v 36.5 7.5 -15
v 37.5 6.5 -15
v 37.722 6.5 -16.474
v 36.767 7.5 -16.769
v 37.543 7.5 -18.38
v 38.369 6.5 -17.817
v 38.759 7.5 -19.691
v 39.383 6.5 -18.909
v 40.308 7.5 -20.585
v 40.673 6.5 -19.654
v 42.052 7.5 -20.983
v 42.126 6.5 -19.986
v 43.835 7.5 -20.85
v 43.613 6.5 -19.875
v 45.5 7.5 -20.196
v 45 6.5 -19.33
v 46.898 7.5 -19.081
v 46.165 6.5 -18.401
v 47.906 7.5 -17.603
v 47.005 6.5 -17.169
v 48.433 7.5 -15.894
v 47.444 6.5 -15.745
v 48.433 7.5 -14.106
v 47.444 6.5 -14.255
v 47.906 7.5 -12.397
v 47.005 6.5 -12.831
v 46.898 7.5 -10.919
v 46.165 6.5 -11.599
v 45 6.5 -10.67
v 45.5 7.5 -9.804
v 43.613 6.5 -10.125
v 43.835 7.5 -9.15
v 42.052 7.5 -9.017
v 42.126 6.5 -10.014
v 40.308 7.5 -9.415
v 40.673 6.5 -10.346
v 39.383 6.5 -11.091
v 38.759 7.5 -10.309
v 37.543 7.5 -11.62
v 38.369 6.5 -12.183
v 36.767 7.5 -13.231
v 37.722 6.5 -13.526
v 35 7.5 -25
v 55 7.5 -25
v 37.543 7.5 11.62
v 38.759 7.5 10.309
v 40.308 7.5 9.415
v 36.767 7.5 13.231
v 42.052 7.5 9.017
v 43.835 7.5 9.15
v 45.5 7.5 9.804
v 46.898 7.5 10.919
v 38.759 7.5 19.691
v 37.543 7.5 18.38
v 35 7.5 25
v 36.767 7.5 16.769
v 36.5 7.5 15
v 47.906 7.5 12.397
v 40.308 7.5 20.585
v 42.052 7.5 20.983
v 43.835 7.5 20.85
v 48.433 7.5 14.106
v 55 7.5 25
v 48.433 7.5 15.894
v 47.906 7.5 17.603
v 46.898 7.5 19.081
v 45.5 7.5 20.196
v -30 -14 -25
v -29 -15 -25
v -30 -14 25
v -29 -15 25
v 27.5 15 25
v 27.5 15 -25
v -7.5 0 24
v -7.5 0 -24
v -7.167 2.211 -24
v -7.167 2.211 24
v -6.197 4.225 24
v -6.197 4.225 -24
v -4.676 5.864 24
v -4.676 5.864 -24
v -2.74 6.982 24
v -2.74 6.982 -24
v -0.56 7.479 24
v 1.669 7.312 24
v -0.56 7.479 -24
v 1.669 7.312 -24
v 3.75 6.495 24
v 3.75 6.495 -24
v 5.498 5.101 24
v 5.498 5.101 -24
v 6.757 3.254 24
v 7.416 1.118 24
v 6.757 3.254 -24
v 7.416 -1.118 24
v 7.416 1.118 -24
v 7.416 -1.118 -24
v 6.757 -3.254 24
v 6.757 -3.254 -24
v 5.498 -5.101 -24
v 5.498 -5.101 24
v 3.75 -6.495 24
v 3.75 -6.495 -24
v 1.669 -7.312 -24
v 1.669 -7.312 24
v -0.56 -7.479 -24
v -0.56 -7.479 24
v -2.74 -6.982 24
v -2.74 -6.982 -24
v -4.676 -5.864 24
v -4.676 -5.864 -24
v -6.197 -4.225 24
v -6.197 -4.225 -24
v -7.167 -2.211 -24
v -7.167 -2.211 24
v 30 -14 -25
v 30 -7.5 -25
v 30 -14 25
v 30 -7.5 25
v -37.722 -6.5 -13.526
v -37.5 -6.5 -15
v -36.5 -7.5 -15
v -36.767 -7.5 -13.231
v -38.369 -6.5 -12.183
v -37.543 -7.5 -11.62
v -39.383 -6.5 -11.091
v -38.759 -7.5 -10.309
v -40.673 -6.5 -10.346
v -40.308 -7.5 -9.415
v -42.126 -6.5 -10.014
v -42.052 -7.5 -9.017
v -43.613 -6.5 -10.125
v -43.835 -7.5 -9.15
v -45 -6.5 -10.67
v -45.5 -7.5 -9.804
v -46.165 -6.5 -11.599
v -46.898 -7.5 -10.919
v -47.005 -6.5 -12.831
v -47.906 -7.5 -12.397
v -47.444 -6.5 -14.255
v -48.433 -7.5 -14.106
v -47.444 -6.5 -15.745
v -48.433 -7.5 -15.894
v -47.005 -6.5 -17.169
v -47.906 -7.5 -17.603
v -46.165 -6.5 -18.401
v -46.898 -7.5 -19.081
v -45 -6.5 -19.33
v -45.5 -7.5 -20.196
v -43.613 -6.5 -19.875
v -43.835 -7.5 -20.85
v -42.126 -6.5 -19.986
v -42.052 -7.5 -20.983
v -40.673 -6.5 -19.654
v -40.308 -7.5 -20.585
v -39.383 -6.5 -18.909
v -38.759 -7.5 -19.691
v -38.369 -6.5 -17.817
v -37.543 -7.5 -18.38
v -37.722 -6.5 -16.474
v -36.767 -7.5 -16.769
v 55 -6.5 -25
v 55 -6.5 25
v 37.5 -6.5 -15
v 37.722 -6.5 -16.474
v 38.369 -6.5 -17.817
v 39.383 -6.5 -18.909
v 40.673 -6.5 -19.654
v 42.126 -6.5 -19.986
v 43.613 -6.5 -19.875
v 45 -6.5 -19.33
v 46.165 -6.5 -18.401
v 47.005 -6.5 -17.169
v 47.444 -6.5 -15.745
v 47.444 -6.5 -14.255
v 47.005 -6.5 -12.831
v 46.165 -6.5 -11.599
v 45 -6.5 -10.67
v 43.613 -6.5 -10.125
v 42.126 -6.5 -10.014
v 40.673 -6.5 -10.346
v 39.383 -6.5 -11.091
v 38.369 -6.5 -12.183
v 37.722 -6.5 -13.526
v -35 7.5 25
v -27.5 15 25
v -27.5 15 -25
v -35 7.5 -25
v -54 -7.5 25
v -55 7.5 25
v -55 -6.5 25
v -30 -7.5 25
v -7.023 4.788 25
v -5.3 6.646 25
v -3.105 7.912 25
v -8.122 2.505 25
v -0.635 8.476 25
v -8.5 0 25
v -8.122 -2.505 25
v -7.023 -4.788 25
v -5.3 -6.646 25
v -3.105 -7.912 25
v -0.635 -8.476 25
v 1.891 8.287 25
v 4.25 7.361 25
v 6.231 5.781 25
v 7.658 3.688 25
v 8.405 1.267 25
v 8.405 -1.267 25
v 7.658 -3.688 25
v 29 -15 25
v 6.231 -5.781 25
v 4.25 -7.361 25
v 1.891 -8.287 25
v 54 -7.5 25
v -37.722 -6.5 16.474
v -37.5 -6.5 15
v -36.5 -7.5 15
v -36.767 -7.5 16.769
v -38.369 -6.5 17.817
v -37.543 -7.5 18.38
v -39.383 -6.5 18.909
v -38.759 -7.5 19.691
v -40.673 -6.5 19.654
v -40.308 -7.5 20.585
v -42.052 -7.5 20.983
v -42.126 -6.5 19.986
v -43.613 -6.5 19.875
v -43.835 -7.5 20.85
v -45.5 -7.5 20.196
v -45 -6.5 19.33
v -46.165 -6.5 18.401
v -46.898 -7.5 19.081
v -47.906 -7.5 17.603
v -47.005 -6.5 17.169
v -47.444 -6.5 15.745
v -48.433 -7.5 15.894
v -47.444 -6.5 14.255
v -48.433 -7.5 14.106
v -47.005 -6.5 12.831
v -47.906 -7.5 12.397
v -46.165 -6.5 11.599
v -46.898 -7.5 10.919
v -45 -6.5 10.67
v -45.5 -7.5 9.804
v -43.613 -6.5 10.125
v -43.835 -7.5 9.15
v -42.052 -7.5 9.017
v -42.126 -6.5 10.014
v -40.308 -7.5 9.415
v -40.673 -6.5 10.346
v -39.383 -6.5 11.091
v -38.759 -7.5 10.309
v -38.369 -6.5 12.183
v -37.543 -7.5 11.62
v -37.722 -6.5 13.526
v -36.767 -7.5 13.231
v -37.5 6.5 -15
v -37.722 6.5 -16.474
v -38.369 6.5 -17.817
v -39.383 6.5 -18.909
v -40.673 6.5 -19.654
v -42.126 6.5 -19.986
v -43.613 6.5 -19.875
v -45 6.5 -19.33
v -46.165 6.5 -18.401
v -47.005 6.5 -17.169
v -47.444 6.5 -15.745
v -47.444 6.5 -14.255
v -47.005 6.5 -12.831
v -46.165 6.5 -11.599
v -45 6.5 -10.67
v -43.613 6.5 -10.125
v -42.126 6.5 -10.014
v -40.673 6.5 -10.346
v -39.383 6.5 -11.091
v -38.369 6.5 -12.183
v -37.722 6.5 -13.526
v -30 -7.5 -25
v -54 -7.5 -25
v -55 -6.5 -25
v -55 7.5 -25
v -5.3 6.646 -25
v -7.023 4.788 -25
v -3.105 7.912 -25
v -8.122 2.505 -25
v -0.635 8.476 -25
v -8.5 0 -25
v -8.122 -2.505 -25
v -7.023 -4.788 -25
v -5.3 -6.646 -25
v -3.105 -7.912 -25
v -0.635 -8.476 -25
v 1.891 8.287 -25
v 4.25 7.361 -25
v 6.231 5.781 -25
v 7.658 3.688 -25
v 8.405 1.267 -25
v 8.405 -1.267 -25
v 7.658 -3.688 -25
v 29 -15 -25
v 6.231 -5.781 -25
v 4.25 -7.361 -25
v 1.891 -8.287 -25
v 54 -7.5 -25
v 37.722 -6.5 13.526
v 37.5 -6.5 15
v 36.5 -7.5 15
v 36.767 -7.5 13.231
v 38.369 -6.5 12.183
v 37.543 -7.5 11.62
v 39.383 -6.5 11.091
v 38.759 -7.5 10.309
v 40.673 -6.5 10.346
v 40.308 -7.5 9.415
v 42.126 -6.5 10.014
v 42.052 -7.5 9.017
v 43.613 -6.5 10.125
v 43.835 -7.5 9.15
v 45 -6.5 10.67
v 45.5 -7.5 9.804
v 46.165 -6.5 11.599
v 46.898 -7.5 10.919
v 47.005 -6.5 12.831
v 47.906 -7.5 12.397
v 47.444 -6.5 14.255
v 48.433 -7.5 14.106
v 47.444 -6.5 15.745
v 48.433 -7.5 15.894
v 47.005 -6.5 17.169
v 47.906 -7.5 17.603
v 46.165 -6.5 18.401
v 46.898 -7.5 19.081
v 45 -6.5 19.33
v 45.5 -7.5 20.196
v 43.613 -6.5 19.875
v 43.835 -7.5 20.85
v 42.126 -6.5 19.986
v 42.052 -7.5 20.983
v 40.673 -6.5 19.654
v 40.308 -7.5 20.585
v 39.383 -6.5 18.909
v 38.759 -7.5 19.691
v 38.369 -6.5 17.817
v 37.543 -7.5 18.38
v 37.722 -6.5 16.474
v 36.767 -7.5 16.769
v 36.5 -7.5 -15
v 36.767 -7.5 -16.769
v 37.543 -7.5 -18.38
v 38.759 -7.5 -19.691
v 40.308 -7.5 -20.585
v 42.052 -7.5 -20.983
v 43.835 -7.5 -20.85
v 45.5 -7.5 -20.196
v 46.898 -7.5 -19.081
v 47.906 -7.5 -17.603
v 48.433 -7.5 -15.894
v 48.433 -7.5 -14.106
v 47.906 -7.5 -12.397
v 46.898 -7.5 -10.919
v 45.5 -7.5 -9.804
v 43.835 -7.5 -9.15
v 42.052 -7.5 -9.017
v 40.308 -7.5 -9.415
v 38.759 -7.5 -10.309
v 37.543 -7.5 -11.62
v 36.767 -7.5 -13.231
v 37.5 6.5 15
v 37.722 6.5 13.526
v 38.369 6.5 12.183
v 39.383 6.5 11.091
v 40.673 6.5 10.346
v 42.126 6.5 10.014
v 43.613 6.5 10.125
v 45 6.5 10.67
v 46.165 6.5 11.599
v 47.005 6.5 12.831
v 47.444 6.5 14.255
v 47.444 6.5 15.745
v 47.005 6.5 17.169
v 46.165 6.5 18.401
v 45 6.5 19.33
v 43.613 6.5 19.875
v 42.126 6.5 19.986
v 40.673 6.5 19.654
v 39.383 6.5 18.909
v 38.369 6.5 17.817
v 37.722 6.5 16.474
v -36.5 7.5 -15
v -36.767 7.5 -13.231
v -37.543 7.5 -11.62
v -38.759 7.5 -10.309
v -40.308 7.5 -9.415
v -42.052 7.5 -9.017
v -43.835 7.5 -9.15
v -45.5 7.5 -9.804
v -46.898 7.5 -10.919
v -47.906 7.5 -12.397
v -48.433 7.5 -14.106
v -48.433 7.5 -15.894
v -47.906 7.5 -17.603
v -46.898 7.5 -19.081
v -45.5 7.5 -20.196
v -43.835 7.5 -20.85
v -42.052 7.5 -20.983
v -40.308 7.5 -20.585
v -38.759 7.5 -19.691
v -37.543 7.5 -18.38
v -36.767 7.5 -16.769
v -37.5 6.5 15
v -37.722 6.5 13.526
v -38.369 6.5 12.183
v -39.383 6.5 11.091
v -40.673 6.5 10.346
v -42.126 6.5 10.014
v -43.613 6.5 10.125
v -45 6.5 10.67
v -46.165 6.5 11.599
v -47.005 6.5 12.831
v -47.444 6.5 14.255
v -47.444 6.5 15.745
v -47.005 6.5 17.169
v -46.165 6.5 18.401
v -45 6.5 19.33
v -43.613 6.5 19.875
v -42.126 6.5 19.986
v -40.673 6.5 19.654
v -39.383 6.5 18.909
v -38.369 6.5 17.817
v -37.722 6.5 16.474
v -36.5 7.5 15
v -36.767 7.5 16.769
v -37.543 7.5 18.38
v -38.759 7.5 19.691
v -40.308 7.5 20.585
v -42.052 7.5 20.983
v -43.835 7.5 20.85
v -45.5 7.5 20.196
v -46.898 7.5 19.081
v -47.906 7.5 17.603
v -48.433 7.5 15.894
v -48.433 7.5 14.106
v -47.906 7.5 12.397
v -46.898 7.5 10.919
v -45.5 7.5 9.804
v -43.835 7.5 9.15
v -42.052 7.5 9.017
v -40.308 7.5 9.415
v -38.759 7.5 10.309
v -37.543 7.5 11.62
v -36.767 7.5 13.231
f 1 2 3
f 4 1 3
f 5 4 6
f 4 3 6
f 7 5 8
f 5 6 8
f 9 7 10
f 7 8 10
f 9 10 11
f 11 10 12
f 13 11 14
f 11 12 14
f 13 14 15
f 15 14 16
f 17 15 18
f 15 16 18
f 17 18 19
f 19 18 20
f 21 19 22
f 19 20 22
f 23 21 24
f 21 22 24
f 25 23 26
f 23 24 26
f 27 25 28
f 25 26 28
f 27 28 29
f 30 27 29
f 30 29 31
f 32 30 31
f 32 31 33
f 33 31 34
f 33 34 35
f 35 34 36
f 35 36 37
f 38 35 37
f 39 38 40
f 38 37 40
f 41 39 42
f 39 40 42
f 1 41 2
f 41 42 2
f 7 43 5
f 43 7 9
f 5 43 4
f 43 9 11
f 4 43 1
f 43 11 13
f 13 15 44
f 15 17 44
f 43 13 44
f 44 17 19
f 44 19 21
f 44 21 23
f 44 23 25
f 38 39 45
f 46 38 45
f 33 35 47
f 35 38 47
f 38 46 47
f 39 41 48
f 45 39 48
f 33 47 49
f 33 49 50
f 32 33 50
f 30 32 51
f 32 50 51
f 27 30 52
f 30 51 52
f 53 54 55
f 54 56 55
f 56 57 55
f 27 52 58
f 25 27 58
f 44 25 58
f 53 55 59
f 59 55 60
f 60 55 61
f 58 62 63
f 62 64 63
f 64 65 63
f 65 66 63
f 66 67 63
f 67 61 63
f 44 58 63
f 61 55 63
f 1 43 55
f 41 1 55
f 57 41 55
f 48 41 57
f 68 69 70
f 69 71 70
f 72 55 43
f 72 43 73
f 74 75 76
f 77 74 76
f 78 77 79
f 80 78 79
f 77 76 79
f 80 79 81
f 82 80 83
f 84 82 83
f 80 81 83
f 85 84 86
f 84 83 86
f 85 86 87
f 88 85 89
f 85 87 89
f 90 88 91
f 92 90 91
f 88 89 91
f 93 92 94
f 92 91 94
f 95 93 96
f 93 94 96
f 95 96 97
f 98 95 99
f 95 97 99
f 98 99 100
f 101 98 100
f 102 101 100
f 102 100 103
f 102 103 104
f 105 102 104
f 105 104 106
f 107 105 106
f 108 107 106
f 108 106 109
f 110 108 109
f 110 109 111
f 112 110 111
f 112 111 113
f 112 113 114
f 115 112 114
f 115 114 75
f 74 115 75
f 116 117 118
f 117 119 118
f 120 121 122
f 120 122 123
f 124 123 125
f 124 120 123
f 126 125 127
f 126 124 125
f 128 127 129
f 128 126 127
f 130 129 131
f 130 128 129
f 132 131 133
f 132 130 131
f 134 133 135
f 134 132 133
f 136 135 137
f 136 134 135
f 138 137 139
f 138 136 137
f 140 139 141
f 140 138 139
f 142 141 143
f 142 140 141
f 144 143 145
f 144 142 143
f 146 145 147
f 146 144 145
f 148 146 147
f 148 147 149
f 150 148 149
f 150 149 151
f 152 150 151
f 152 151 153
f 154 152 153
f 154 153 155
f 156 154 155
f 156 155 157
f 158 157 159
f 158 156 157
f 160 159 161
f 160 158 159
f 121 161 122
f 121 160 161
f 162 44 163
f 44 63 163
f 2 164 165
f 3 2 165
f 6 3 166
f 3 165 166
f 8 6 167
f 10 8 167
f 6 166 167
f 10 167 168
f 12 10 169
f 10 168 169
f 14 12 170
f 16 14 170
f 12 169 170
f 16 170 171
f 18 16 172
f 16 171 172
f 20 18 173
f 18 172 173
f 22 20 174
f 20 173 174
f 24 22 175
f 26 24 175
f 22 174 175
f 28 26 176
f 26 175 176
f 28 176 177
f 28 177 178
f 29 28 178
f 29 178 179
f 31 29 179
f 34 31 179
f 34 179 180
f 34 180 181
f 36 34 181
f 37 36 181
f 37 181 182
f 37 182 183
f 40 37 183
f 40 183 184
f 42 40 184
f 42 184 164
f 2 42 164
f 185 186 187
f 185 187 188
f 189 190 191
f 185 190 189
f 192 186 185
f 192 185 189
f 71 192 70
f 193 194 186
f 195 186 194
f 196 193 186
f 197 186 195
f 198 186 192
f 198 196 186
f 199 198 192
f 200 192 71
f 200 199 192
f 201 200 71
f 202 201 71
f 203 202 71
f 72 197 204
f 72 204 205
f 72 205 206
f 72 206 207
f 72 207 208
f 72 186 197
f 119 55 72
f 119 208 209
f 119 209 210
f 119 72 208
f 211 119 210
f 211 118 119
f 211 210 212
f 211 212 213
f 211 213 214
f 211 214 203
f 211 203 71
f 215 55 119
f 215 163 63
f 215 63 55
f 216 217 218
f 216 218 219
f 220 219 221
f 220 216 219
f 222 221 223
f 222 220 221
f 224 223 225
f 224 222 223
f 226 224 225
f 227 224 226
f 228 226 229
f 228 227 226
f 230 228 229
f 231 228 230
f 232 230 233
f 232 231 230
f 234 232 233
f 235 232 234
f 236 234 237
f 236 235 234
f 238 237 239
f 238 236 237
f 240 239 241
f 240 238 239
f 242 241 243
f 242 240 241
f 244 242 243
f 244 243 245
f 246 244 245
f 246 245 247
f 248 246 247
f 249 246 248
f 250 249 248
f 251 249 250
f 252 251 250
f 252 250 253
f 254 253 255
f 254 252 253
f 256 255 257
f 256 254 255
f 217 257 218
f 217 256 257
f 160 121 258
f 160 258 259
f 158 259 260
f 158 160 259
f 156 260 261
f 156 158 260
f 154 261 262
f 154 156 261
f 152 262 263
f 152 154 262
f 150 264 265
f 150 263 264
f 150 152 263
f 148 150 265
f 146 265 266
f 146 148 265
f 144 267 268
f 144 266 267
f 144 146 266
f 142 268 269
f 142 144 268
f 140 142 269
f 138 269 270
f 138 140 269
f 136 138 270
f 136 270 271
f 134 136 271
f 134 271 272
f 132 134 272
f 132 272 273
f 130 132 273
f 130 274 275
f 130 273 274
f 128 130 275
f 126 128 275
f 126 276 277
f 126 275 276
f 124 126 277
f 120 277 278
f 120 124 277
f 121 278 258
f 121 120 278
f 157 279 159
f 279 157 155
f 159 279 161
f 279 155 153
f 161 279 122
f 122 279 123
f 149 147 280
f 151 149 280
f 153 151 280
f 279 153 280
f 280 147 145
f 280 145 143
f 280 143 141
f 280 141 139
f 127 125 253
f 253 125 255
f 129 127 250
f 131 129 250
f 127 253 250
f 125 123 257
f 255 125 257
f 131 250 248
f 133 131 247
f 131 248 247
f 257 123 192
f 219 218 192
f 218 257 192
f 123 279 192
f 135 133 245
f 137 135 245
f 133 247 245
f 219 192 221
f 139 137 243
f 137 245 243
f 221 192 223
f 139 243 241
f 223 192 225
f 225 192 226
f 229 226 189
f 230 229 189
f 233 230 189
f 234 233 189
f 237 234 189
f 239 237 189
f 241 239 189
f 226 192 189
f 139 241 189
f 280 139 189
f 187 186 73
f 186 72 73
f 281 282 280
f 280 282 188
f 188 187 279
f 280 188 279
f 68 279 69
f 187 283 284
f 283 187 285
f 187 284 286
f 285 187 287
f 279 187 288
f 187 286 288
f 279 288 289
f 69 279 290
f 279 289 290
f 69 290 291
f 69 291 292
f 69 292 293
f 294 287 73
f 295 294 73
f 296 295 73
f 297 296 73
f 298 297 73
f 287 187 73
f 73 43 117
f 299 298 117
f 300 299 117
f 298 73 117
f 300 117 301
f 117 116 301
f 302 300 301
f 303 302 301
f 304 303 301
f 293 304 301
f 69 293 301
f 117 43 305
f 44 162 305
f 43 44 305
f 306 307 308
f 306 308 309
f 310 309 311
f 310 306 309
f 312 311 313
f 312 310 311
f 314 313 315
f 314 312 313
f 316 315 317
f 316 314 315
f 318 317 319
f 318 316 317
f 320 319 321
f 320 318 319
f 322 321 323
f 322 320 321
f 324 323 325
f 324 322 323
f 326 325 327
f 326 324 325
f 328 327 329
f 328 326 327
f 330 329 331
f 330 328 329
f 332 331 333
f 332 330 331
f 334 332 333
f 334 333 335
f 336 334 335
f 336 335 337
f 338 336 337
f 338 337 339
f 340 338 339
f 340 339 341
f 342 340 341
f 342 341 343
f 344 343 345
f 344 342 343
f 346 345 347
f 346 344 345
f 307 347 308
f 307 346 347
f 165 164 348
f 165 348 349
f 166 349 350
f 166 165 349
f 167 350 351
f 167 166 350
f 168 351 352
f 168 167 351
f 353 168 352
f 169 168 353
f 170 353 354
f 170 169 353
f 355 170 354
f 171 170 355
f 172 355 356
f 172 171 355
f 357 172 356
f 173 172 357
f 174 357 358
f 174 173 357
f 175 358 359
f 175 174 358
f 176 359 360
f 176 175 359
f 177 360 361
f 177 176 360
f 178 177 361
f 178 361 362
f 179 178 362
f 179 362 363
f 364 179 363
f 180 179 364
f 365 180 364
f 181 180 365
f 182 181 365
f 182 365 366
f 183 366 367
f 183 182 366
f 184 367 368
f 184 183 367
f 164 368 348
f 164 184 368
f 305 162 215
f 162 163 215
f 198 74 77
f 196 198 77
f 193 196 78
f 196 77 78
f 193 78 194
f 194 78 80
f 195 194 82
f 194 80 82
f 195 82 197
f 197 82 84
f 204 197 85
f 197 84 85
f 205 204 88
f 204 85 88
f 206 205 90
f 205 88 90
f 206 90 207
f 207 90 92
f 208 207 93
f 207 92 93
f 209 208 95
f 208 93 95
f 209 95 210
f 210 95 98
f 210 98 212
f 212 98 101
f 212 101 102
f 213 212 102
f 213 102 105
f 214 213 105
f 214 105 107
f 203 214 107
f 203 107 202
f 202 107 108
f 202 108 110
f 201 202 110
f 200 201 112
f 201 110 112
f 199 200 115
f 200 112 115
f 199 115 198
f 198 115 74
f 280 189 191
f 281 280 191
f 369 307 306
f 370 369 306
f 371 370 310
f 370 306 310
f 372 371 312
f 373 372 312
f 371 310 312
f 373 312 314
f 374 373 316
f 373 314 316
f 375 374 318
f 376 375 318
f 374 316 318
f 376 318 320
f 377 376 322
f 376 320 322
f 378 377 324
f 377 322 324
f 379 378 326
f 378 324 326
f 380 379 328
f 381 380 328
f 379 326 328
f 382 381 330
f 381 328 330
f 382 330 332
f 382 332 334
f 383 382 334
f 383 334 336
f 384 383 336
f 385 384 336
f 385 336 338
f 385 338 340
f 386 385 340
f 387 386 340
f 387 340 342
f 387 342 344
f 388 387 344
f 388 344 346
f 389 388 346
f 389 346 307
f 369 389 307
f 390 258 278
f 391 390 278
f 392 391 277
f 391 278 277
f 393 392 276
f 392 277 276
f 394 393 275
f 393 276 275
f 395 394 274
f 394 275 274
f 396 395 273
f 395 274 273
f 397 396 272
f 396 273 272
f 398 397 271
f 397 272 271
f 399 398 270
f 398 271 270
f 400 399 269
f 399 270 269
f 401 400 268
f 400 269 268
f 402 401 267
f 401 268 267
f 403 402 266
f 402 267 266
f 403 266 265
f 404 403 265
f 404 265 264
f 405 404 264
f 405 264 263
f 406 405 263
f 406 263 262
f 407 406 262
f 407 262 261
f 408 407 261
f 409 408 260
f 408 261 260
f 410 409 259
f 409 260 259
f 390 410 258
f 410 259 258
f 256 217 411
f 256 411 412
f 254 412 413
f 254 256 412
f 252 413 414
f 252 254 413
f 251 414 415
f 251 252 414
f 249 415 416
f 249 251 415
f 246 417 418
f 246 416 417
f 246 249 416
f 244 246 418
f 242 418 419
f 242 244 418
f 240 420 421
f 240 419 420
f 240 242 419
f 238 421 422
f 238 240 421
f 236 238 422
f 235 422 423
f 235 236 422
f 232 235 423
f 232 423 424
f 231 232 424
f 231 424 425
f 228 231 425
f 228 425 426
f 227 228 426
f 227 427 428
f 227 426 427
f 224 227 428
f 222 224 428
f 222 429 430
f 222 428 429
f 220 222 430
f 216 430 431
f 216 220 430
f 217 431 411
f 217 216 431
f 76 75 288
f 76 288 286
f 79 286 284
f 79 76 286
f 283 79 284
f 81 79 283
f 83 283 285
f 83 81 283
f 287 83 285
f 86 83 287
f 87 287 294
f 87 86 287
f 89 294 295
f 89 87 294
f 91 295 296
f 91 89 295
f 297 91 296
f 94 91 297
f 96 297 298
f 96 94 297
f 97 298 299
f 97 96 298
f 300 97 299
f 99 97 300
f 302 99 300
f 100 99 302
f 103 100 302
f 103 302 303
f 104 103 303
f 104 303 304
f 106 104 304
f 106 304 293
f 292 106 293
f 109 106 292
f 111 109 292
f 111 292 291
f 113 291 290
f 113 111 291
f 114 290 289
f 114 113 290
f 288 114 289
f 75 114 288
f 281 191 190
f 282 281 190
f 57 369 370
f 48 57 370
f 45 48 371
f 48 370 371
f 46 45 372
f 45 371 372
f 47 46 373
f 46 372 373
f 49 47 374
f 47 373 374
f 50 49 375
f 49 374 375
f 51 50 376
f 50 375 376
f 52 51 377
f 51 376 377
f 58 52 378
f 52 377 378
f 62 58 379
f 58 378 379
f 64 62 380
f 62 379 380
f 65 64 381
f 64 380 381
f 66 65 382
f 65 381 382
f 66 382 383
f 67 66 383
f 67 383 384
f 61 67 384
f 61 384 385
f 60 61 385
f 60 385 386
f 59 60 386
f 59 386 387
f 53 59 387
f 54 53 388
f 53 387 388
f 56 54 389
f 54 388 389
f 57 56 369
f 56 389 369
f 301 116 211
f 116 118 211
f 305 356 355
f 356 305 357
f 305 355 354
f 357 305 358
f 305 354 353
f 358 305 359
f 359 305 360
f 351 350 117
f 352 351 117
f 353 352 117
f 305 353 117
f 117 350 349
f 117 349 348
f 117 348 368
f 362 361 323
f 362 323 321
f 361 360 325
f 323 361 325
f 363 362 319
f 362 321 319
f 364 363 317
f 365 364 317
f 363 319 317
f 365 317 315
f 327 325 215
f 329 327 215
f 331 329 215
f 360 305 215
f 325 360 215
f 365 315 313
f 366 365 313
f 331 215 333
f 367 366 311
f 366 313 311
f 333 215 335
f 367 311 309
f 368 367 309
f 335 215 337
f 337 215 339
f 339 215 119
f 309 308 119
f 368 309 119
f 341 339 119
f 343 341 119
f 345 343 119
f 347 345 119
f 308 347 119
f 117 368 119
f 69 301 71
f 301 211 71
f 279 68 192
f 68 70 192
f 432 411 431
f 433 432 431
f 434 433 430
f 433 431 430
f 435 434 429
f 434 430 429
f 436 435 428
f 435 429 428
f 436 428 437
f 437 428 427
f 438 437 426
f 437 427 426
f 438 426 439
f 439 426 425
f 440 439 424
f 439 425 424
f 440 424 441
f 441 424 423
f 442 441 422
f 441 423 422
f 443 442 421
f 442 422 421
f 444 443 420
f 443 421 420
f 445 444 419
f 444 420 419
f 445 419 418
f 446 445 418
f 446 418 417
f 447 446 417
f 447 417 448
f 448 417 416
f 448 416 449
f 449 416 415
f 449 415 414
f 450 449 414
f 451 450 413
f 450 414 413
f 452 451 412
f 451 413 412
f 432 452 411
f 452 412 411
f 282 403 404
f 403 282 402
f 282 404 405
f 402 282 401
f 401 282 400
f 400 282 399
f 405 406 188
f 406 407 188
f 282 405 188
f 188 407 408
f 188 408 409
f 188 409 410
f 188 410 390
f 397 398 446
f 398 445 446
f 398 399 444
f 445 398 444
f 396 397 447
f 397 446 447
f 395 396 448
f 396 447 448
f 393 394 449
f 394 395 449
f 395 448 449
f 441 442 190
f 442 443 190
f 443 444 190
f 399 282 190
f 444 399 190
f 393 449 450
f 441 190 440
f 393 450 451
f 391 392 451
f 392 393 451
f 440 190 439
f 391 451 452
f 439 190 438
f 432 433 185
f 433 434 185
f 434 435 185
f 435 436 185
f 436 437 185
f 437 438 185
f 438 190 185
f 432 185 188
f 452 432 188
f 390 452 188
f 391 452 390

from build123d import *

# Parameters (mm, degrees)
BOSS_EXTRUDE1_DEPTH = 25
CHAMFER2_SIZE       = 10
HOLE1_D             = 15
CHAMFER3_SIZE       = 1
HOLE2_D             = 10
CHAMFER4_SIZE       = 1
CHAMFER5_SIZE       = 1


with BuildPart() as part:
    # Sketch1 → Boss-Extrude1 (new, symmetric)
    with BuildSketch(Plane.XY):
        Polygon((-55, -6.5), (-55, 7.5), (-25, 7.5), (-25, 15), (25, 15), (25, 7.5), (55, 7.5), (55, -6.5), (54, -7.5), (30, -7.5), (30, -14), (29, -15), (-29, -15), (-30, -14), (-30, -7.5), (-54, -7.5), align=None)
    extrude(amount=BOSS_EXTRUDE1_DEPTH, both=True)

    # Chamfer2
    # the kernel refuses this chamfer: 10 mm, written as the material it adds along each edge
    with BuildSketch(Plane(origin=(25, 7.5, 25), x_dir=(0.9996219169112968, -0.027495876610586403, 0), z_dir=(0, 0, -1))) as chamfer2_piece_1_section:
        Polygon((CHAMFER2_SIZE * 0.999621916911, -CHAMFER2_SIZE * 0.0274958766106), (-CHAMFER2_SIZE * 0.0274958766106, -CHAMFER2_SIZE * 0.999621916911), (0, 0), align=None)
    chamfer2_piece_1 = extrude(amount=50, mode=Mode.PRIVATE)
    chamfer2_piece_1 = split(chamfer2_piece_1, bisect_by=Plane(origin=(28.519591102, 15, 0), z_dir=(0, -1, 0)), keep=Keep.TOP, mode=Mode.PRIVATE)
    add(chamfer2_piece_1)
    with BuildSketch(Plane(origin=(-25, 7.5, 25), x_dir=(0.027495876610586317, 0.9996219169112968, 0), z_dir=(0, 0, -1))) as chamfer2_piece_2_section:
        Polygon((CHAMFER2_SIZE * 0.999621916911, -CHAMFER2_SIZE * 0.0274958766106), (-CHAMFER2_SIZE * 0.0274958766106, -CHAMFER2_SIZE * 0.999621916911), (0, 0), align=None)
    chamfer2_piece_2 = extrude(amount=50, mode=Mode.PRIVATE)
    chamfer2_piece_2 = split(chamfer2_piece_2, bisect_by=Plane(origin=(-28.519591102, 15, 0), z_dir=(0, -1, 0)), keep=Keep.TOP, mode=Mode.PRIVATE)
    add(chamfer2_piece_2)

    # Hole1 (through all)
    with Locations(Plane.XY.offset(25)):
        with Locations((0, 0)):
            Hole(HOLE1_D / 2)

    # Chamfer3
    chamfer3_edges = [part.edges().sort_by_distance(p)[0] for p in [
        (7.5, 0, 25),
        (7.5, 0, -25),
    ]]
    chamfer(chamfer3_edges, length=CHAMFER3_SIZE)

    # Hole2 (through all)
    with Locations(Plane(origin=(0, 7.5, 0), x_dir=(1, 0, 0), z_dir=(0, 1, 0))):
        with Locations((42.5, 15), (42.5, -15)):
            hole2 = Hole(HOLE2_D / 2)

    # Chamfer4
    chamfer4_edges = [part.edges().sort_by_distance(p)[0] for p in [
        (47.5, 7.5, 15),
        (47.5, -7.5, 15),
        (47.5, 7.5, -15),
        (47.5, -7.5, -15),
    ]]
    chamfer(chamfer4_edges, length=CHAMFER4_SIZE)

    # Mirror5: Hole2 across plane
    add(hole2.mirror(Plane(origin=(0, 0, 0), x_dir=(0, 0, 1), z_dir=(1, 0, 0))), mode=Mode.SUBTRACT)

    # Chamfer5
    chamfer5_edges = [part.edges().sort_by_distance(p)[0] for p in [
        (-47.5, 7.5, 15),
        (-47.5, -7.5, 15),
        (-47.5, 7.5, -15),
        (-47.5, -7.5, -15),
    ]]
    chamfer(chamfer5_edges, length=CHAMFER5_SIZE)


solid = part.part
